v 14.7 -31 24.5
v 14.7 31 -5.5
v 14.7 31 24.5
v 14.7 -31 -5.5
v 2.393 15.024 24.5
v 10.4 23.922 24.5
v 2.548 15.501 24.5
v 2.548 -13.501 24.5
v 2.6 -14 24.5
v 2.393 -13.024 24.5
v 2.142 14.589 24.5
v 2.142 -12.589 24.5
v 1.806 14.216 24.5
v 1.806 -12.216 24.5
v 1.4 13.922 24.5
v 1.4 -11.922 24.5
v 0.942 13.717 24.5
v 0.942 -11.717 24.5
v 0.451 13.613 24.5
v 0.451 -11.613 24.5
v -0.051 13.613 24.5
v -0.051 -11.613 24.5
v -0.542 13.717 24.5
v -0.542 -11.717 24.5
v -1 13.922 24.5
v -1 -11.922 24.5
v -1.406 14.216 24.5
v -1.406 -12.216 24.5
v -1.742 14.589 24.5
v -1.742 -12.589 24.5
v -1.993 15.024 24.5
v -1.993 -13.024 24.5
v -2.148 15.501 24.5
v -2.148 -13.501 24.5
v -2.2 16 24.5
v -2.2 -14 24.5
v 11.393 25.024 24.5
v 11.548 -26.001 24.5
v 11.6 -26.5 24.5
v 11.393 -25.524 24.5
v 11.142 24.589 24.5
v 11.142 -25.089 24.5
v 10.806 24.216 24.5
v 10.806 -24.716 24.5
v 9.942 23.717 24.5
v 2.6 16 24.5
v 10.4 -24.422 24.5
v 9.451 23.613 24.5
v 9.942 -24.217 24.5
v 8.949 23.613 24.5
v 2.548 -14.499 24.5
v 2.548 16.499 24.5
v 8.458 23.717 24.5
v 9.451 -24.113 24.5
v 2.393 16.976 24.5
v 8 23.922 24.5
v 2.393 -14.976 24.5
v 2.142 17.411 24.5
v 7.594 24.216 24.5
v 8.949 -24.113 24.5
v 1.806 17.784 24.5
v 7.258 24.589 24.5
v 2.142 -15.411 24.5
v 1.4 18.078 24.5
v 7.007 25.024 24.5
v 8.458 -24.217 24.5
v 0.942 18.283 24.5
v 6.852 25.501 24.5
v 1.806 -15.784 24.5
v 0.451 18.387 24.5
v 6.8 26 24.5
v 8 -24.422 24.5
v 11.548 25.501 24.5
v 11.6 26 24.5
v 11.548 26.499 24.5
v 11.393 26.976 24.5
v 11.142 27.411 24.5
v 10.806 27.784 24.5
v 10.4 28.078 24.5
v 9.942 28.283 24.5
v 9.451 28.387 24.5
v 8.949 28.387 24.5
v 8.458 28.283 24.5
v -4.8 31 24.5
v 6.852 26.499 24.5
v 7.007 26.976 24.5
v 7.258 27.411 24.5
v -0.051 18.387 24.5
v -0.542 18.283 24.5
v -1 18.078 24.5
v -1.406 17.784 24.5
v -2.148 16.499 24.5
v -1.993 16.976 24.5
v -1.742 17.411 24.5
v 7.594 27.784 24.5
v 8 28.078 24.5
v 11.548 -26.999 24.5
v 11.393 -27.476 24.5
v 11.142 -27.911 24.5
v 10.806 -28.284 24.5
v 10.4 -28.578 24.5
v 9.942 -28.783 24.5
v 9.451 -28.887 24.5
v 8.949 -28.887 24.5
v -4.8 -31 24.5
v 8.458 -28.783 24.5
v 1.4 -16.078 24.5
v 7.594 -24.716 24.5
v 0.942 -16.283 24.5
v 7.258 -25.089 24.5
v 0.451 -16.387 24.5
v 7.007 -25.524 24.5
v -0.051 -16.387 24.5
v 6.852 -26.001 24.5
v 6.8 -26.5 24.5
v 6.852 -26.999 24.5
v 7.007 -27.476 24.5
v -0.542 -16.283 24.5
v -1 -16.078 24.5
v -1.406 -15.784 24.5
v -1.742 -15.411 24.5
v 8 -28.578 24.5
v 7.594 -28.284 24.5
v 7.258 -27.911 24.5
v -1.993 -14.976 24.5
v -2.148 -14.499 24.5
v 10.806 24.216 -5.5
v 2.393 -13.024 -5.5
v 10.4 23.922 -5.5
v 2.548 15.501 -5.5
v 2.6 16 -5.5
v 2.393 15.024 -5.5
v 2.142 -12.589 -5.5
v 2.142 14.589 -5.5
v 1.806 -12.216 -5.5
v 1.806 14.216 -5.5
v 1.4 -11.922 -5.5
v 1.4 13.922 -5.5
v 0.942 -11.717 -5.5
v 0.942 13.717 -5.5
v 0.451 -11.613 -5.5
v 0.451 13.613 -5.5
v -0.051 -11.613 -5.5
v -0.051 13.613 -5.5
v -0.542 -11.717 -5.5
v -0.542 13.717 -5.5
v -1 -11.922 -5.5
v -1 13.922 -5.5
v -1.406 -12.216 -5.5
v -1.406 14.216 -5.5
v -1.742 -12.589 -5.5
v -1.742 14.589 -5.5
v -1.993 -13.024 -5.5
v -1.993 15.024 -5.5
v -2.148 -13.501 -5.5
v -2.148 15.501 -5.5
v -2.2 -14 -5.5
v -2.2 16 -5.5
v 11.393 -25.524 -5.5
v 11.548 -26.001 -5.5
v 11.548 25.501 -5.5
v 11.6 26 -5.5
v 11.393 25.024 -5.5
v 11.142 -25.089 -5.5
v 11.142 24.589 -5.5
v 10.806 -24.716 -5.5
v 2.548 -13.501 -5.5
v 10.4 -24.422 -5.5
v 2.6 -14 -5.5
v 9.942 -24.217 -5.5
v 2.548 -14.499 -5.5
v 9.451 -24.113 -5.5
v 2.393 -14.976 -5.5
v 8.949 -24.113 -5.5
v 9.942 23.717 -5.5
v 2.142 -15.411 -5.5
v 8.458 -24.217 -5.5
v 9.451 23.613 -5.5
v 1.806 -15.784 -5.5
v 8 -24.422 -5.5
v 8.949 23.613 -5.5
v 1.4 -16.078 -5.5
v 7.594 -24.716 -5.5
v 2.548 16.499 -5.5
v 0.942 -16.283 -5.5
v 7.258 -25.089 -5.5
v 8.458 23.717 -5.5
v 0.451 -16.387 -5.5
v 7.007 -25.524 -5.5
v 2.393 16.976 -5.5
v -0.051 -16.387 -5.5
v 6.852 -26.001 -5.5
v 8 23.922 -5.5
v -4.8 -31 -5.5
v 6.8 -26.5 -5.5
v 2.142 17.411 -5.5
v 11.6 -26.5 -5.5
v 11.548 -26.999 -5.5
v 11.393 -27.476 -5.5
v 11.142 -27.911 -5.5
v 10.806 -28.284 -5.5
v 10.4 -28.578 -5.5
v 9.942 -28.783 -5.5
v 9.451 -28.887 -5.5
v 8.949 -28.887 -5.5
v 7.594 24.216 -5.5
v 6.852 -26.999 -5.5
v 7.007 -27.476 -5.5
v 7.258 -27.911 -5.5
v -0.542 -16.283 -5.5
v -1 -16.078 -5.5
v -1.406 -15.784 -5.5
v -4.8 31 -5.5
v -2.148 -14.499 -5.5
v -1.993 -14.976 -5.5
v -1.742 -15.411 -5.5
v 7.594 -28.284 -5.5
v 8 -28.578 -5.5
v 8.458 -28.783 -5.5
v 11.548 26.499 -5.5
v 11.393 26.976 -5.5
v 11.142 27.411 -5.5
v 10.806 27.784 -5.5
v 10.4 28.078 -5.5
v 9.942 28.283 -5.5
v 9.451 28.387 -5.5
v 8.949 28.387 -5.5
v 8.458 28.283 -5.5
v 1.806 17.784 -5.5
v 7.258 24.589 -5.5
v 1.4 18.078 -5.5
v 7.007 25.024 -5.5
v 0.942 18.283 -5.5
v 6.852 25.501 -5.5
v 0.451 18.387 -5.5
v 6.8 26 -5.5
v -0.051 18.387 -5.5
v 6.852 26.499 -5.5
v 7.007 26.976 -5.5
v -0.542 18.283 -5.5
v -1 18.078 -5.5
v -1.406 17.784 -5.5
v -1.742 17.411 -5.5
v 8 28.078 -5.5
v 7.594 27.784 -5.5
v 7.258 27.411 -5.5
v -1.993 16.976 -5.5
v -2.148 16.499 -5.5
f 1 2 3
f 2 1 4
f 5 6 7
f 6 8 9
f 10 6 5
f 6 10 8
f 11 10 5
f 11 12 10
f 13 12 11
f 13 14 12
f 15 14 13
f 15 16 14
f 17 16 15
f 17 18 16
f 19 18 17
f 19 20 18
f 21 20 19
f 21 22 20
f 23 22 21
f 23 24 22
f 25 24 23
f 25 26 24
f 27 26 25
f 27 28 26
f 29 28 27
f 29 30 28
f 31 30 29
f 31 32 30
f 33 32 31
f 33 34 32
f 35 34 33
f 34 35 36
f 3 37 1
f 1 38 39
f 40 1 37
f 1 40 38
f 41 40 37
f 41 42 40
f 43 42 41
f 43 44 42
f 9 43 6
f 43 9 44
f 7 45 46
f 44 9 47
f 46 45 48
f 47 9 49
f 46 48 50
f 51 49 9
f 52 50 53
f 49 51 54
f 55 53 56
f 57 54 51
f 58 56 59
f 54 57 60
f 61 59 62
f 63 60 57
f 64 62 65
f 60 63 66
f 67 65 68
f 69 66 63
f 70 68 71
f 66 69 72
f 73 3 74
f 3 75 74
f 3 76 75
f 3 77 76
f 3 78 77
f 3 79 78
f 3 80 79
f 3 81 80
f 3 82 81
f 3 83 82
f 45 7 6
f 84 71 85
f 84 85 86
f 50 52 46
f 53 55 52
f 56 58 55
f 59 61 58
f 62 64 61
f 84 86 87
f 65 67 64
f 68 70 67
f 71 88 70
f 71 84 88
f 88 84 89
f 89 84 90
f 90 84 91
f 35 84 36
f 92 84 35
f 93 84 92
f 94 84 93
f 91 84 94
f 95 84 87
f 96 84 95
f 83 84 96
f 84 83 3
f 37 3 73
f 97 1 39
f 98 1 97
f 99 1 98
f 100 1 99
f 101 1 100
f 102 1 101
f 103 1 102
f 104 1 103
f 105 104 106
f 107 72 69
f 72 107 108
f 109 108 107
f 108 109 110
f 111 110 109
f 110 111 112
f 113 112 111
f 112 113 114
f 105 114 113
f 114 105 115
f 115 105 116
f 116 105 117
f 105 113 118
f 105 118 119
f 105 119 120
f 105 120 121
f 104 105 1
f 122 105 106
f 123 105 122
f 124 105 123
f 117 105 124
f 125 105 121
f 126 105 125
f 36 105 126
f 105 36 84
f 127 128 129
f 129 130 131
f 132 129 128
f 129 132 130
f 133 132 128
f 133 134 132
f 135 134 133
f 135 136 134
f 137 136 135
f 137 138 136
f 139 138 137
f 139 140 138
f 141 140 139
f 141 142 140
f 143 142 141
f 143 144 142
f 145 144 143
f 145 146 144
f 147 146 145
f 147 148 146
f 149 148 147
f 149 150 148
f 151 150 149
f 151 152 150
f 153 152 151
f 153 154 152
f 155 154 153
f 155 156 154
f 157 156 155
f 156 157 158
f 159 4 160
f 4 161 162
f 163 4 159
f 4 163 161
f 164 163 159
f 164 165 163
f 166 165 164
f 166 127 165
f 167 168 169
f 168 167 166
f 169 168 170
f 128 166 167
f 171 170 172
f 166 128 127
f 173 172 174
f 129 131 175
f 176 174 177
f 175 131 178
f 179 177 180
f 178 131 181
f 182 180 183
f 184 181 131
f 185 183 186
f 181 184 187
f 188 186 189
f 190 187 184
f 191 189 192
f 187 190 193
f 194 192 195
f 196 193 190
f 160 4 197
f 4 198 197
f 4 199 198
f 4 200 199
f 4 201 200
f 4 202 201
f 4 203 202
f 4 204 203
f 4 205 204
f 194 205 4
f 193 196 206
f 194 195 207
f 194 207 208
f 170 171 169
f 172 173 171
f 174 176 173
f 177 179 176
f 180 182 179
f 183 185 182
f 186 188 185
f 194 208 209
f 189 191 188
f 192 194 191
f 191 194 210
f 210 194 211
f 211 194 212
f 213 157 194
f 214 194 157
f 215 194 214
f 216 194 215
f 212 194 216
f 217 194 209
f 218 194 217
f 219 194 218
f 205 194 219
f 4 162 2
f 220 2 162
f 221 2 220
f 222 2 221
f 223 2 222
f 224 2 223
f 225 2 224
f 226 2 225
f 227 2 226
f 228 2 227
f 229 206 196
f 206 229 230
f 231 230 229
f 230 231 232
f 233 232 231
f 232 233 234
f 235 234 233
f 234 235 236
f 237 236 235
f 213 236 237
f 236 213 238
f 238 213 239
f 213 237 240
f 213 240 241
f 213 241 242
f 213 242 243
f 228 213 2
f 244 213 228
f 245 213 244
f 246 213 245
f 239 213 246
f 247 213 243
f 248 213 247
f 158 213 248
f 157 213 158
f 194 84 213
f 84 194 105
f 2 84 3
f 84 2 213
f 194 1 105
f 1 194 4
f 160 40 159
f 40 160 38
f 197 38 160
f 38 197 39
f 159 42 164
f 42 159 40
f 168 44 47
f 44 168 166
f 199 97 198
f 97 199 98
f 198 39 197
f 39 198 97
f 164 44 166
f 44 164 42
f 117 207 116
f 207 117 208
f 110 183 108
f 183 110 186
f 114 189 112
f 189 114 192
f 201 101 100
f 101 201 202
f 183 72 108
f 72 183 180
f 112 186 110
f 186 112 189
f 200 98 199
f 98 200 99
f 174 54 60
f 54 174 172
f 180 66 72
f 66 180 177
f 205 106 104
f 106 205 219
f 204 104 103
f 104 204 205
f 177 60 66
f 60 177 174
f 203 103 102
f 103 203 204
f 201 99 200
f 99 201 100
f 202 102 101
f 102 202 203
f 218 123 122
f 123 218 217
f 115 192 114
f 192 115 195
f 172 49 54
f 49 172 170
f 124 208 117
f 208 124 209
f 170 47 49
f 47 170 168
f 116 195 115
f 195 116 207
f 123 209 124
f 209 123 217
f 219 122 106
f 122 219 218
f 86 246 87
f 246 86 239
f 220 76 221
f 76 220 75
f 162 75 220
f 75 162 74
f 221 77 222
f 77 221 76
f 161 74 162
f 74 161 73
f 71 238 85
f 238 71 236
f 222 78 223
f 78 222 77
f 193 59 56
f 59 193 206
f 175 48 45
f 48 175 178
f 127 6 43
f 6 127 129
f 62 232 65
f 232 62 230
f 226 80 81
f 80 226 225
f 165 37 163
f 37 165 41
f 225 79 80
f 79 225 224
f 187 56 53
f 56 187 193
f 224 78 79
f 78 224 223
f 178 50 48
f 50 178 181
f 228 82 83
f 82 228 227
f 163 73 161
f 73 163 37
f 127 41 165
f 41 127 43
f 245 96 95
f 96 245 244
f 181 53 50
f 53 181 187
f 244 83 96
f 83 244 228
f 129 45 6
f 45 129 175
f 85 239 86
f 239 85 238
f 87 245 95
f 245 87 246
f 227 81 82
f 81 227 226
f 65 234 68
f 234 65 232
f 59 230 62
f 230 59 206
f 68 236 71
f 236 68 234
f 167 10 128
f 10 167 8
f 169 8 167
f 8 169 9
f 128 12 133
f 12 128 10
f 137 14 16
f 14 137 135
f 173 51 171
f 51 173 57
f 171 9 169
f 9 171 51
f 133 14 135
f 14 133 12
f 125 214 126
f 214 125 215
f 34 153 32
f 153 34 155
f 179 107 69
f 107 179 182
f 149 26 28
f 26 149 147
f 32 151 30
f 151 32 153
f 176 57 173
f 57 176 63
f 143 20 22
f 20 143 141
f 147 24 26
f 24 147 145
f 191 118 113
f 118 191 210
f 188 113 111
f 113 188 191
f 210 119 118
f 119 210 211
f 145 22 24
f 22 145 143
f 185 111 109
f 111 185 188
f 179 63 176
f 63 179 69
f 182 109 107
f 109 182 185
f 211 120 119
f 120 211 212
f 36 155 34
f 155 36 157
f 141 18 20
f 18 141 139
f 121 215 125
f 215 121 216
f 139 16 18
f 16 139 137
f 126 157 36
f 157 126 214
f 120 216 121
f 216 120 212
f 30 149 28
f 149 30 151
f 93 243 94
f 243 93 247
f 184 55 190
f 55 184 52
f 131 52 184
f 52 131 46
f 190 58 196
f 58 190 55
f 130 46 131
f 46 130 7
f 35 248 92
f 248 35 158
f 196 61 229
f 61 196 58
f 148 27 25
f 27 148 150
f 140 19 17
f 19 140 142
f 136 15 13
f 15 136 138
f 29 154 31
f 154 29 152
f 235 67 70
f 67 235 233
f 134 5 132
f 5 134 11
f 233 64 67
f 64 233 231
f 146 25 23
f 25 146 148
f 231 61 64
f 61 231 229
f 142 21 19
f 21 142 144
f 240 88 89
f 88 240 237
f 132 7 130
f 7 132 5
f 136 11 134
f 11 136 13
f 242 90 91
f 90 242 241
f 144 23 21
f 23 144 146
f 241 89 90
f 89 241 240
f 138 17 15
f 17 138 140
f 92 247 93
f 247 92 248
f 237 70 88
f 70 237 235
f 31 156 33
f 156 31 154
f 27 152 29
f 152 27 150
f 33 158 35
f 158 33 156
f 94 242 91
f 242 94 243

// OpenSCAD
carriage_yaxis_wall();
//carriage_yaxis_wall();


module carriage_yaxis_wall(){
difference(){
 union(){
  translate([0,-1,0.5]){
  translate([-10+1.5-11.8+15.5,20+20-55-2-10-3,-10+28+8-32])color("pink")cube([14.5+5,31+23+8,29+1]);
  }
 }
translate([-10+1.5-11.8+15.5+5+8.5+0.5,20+20-48-8-10-0.5,-10+28+8-32-50])cylinder(r=4.8/2,h=250,$fn=30);
translate([-10+1.5-11.8+15.5+5+8.5+0.5,20+20-48+18+8+7.5+0.5,-10+28+8-32-50])cylinder(r=4.8/2,h=250,$fn=30);
translate([-10+1.5-11.8+15.5+5,20+20-48-8+2,-10+28+8-32-50])cylinder(r=4.8/2,h=250,$fn=30);
translate([-10+1.5-11.8+15.5+5,20+20-48+18+8-2,-10+28+8-32-50])cylinder(r=4.8/2,h=250,$fn=30);
}
}
